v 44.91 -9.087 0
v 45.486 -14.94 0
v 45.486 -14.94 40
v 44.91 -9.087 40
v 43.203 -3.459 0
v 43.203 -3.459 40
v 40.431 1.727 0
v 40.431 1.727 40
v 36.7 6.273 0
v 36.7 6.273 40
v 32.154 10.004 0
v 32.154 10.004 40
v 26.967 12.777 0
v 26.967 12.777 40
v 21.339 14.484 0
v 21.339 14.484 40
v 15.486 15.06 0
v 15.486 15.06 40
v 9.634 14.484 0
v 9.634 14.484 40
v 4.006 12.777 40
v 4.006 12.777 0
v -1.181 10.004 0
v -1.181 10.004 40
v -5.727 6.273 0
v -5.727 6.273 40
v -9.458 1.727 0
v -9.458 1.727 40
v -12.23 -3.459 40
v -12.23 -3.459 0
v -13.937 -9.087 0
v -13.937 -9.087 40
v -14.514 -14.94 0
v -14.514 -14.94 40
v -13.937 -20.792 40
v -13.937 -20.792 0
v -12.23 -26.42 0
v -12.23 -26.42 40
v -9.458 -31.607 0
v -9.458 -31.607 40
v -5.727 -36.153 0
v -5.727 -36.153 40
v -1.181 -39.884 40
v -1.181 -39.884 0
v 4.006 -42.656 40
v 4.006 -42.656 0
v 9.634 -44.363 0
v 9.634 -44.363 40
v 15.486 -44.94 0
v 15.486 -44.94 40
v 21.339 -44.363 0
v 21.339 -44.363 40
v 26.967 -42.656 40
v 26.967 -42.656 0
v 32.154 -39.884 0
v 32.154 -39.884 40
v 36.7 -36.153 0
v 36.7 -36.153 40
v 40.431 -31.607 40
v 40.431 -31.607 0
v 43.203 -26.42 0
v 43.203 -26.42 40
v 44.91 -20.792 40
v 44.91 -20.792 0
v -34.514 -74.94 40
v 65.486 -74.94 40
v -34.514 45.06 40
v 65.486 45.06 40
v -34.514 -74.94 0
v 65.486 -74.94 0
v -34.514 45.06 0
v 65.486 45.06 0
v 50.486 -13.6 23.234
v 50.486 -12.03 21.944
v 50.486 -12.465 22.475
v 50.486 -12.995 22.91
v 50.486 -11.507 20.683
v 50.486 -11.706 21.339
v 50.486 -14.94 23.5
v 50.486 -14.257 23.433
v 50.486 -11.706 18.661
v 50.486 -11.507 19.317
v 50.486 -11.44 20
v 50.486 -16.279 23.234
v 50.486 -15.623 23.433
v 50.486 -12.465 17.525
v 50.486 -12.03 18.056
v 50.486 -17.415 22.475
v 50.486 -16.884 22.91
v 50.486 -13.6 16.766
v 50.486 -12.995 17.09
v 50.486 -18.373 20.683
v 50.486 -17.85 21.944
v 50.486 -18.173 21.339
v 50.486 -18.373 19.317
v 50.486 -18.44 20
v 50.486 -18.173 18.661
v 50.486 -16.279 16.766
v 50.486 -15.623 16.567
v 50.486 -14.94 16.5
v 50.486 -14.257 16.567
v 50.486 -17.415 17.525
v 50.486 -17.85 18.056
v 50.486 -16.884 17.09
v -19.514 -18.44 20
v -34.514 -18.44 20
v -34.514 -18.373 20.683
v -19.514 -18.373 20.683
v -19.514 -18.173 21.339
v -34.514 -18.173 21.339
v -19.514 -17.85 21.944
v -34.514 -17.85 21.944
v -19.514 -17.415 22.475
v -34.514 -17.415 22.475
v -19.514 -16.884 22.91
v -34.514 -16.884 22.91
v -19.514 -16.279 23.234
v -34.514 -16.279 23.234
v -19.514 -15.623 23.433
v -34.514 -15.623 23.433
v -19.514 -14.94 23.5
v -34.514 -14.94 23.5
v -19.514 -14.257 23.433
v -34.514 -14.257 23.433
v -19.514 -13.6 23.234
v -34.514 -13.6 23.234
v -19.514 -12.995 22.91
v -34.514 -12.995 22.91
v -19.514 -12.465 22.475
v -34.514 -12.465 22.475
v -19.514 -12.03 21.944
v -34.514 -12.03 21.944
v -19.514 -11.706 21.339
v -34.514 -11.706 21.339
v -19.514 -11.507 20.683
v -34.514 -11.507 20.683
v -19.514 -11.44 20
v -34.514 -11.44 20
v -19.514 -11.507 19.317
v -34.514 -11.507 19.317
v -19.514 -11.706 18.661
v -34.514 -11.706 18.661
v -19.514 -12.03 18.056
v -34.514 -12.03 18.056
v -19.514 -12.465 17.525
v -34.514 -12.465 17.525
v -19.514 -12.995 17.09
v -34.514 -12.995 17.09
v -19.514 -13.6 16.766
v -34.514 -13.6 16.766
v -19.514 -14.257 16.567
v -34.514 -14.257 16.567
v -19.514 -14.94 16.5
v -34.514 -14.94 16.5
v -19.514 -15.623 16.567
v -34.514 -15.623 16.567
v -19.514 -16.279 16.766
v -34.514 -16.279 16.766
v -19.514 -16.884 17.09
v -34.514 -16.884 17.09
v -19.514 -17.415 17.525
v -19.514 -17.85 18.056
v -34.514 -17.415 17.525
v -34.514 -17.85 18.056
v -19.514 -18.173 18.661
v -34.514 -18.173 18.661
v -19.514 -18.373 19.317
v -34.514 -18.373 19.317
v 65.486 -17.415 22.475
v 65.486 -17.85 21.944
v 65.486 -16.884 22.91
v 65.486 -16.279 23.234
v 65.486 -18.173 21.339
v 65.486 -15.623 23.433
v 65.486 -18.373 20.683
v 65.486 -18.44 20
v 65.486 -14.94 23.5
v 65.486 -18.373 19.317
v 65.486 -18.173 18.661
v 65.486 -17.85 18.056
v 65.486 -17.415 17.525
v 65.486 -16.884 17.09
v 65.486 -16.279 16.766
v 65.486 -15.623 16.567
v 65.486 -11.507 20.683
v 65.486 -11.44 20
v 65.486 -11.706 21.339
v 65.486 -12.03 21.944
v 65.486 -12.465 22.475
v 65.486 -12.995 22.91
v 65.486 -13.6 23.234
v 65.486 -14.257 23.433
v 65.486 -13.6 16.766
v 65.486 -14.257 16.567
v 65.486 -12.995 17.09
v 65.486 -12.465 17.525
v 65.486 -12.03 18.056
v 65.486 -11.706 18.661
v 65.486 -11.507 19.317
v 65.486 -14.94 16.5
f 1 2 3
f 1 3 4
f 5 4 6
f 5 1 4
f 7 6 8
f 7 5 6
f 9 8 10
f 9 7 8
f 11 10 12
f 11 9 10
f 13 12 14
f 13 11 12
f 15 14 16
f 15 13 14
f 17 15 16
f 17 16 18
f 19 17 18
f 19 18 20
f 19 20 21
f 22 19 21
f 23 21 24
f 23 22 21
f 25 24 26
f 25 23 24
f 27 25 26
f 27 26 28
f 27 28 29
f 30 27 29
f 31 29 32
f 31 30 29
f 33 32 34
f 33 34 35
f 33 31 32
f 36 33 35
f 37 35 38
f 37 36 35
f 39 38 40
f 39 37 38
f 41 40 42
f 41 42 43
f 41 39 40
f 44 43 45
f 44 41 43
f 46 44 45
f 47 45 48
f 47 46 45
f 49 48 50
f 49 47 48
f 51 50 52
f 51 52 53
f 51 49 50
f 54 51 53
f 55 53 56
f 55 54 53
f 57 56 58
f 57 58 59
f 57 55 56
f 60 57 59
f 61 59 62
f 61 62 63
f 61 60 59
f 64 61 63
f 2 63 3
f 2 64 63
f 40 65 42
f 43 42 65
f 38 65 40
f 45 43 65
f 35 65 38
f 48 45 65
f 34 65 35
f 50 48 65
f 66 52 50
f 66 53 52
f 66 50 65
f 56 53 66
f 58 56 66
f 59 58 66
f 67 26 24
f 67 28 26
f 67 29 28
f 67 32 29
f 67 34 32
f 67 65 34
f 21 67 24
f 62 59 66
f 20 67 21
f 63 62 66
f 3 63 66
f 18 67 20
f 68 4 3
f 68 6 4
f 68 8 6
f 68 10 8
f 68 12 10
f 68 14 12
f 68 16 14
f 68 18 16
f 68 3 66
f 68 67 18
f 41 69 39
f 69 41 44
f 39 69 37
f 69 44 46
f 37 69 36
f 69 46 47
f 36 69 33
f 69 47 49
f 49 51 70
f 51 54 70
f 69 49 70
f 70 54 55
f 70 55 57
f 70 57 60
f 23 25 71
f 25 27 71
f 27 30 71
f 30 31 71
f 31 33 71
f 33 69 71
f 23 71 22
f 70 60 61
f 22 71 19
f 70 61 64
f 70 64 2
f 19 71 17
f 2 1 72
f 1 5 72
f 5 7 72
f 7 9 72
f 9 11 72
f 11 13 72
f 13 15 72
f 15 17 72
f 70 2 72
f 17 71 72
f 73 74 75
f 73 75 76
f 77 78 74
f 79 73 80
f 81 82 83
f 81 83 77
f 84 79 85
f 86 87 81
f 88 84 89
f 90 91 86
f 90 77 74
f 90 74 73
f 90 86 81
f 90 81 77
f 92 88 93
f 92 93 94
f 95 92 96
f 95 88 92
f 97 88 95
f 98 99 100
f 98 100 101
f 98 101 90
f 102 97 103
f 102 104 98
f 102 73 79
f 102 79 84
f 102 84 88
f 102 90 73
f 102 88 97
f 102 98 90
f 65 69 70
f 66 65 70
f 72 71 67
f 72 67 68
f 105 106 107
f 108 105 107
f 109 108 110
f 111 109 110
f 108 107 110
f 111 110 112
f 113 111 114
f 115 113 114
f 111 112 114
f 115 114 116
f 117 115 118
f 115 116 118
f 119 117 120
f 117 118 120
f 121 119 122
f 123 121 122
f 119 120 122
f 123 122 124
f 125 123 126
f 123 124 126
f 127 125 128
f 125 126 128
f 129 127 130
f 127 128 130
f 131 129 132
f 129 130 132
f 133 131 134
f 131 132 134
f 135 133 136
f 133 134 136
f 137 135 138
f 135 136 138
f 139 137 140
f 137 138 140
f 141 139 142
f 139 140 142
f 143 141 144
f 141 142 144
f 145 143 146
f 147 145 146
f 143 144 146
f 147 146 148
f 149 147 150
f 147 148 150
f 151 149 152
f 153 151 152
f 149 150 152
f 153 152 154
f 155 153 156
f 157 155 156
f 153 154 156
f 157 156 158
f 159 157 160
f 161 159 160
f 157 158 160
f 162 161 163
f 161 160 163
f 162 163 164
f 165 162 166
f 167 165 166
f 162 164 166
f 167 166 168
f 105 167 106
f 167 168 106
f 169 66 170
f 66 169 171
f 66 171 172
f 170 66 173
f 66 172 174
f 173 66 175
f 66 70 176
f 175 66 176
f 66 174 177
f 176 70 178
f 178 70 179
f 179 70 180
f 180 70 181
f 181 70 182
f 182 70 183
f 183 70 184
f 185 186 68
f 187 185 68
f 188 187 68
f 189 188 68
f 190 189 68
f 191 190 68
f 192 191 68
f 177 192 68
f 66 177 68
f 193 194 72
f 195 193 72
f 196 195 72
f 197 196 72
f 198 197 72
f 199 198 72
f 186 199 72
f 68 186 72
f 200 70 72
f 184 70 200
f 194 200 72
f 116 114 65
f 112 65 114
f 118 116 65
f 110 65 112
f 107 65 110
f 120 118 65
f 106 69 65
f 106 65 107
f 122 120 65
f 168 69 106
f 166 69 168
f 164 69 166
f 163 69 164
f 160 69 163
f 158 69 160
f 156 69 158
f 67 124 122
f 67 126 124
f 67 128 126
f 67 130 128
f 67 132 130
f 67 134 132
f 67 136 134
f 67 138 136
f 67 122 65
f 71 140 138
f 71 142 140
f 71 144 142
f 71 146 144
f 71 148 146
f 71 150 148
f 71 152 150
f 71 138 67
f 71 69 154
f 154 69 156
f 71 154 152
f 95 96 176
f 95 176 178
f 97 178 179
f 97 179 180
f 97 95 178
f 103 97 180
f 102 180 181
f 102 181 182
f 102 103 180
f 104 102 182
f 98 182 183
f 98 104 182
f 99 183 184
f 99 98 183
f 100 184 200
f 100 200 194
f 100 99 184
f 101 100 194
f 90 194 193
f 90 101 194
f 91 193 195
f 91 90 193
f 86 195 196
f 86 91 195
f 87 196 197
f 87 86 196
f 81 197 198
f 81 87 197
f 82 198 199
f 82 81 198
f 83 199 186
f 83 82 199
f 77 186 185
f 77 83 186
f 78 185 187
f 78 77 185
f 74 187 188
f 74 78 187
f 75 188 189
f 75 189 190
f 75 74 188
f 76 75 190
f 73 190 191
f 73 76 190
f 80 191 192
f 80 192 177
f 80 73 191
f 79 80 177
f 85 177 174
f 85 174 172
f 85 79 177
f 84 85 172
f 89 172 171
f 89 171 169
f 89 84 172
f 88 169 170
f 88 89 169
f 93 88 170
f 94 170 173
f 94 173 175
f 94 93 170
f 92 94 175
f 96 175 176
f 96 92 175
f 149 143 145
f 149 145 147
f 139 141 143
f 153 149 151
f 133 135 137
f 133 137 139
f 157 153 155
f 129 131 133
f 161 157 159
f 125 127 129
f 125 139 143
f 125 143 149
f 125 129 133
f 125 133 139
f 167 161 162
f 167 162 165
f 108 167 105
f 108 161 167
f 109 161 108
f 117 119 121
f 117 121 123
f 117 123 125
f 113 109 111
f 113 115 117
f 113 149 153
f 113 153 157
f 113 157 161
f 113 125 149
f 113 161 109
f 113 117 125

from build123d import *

# Parameters (mm, degrees)
SKETCH1_W           = 100
SKETCH1_H           = 120
SKETCH1_R           = 30
BOSS_EXTRUDE1_DEPTH = 40
SKETCH2_R           = 3.5
CUT_EXTRUDE1_DEPTH  = 15
CUT_EXTRUDE2_START  = -15
SKETCH3_R           = 3.5
CUT_EXTRUDE2_DEPTH  = 15


with BuildPart() as part:
    # Sketch1 → Boss-Extrude1 (new body)
    with BuildSketch(Plane.XY):
        with Locations((15.48649625, -14.939759036)):
            Rectangle(SKETCH1_W, SKETCH1_H)
        with Locations((15.48649625, -14.939759036)):
            Circle(SKETCH1_R, mode=Mode.SUBTRACT)
    extrude(amount=BOSS_EXTRUDE1_DEPTH)

    # Sketch2 → Cut-Extrude1 (cut)
    with BuildSketch(Plane.ZY.offset(34.51350375)):
        with Locations(Location((20, -14.939759036, 0), (0, 0, 270))):
            Circle(SKETCH2_R)
    extrude(amount=-CUT_EXTRUDE1_DEPTH, mode=Mode.SUBTRACT)

    # Sketch3 → Cut-Extrude2 (cut)
    with BuildSketch(Plane(origin=(65.48649625, 0, 0), x_dir=(0, 0, -1), z_dir=(1, 0, 0)).offset(CUT_EXTRUDE2_START)):
        with Locations(Location((-20, -14.939759036, 0), (0, 0, 270))):
            Circle(SKETCH3_R)
    extrude(amount=CUT_EXTRUDE2_DEPTH, mode=Mode.SUBTRACT)


solid = part.part
